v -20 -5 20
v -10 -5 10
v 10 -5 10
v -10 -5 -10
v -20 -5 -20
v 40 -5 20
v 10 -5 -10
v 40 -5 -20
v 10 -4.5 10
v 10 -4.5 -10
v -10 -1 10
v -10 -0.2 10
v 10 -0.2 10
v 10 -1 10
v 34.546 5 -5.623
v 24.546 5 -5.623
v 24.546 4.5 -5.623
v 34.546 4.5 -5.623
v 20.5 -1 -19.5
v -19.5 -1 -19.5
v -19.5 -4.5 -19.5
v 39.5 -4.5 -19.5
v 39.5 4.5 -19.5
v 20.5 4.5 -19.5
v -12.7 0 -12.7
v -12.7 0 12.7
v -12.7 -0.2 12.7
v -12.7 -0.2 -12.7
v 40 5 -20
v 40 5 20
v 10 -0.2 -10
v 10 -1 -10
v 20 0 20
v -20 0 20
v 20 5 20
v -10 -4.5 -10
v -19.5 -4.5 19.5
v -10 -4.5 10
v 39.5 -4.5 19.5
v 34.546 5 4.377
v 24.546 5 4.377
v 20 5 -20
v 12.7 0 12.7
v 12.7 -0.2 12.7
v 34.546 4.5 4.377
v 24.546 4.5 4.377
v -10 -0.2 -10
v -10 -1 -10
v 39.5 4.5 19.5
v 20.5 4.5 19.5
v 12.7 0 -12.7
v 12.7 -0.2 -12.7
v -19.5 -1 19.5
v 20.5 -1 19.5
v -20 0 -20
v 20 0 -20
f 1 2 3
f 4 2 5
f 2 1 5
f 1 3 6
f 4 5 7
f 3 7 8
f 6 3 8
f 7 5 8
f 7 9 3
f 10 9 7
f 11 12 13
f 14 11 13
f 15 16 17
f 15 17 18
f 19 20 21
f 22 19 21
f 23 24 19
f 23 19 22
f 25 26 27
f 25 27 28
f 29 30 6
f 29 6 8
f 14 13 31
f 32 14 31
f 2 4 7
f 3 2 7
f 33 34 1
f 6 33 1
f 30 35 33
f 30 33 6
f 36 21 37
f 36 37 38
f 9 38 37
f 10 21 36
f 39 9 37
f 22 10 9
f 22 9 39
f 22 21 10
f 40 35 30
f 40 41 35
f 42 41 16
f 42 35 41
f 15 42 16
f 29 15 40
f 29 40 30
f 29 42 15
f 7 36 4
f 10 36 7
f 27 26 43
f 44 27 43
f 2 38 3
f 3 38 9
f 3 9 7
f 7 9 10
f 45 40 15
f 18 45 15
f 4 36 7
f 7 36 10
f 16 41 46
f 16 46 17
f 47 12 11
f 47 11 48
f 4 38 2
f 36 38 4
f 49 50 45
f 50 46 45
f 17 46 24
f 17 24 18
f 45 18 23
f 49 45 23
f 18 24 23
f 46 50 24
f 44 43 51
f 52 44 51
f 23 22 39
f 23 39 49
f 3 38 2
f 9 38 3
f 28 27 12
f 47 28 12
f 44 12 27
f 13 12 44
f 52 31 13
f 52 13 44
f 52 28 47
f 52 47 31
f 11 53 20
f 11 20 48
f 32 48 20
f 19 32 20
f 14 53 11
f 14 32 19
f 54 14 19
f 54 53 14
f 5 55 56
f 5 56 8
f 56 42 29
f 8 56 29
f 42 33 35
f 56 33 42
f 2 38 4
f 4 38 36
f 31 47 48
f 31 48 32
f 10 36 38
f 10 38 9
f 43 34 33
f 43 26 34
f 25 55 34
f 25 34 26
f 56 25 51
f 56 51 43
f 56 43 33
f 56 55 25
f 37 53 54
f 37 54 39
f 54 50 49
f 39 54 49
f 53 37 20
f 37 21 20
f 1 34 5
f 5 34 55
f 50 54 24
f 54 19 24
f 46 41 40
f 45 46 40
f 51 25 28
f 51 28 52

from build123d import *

# Parameters (mm, degrees)
SKETCH1_W                = 40
SKETCH1_H                = 40
SKETCH1_W_2              = 20
SKETCH1_H_2              = 20
BOSS_EXTRUDE1_DEPTH      = 5
BOSS_EXTRUDE2_DEPTH      = 5
BOSS_EXTRUDE2_DEPTH_BACK = 5
SKETCH1_4_W              = 20
SKETCH1_4_H              = 40
SKETCH2_W                = 25.4
SKETCH2_H                = 25.4
CUT_EXTRUDE1_DEPTH       = 0.2
CUT_EXTRUDE2_DEPTH       = 19.5
CUT_EXTRUDE2_DEPTH_BACK  = 19.5
SKETCH3_W                = 59
SKETCH3_H                = 3.5
CUT_EXTRUDE3_DEPTH       = 19.5
CUT_EXTRUDE3_DEPTH_BACK  = 19.5
SKETCH4_W                = 10
SKETCH4_H                = 10
CUT_EXTRUDE4_DEPTH       = 2
SKETCH7_W                = 20
SKETCH7_H                = 20
BOSS_EXTRUDE3_DEPTH      = 0.5


with BuildPart() as part:
    # Sketch1 → Boss-Extrude1 (new body)
    with BuildSketch(Plane(origin=(0, 0, 0), x_dir=(1, 0, 0), z_dir=(0, 1, 0))):
        Rectangle(SKETCH1_W, SKETCH1_H)
        Rectangle(SKETCH1_W_2, SKETCH1_H_2, mode=Mode.SUBTRACT)
    extrude(amount=-BOSS_EXTRUDE1_DEPTH)

    # Sketch1<4> → Boss-Extrude2 (add, two sides: drawn at the far end of the back side and taken through both)
    with BuildSketch(Plane(origin=(0, 0, 0), x_dir=(1, 0, 0), z_dir=(0, 1, 0)).offset(-BOSS_EXTRUDE2_DEPTH_BACK)):
        with Locations((30, 0)):
            Rectangle(SKETCH1_4_W, SKETCH1_4_H)
    extrude(amount=BOSS_EXTRUDE2_DEPTH + BOSS_EXTRUDE2_DEPTH_BACK)

    # Sketch2 → Cut-Extrude1 (cut)
    with BuildSketch(Plane(origin=(0, 0, 0), x_dir=(1, 0, 0), z_dir=(0, 1, 0))):
        Rectangle(SKETCH2_W, SKETCH2_H)
    extrude(amount=-CUT_EXTRUDE1_DEPTH, mode=Mode.SUBTRACT)

    # Sketch3 → Cut-Extrude2 (cut, two sides: drawn at the far end of the back side and taken through both)
    with BuildSketch(Plane.XY.offset(-CUT_EXTRUDE2_DEPTH_BACK)):
        with Locations((10, -2.75)):
            Rectangle(SKETCH3_W, SKETCH3_H)
    extrude(amount=CUT_EXTRUDE2_DEPTH + CUT_EXTRUDE2_DEPTH_BACK, mode=Mode.SUBTRACT)

    # Sketch5 → Cut-Extrude3 (cut, two sides: drawn at the far end of the back side and taken through both)
    with BuildSketch(Plane.XY.offset(-CUT_EXTRUDE3_DEPTH_BACK)):
        Polygon((39.5, -4.5), (20.5, -4.5), (20, -4.5), (20, -1), (20.5, -1), (20.5, 4.5), (39.5, 4.5), align=None)
    extrude(amount=CUT_EXTRUDE3_DEPTH + CUT_EXTRUDE3_DEPTH_BACK, mode=Mode.SUBTRACT)

    # Sketch4 → Cut-Extrude4 (cut)
    with BuildSketch(Plane(origin=(0, 5, 0), x_dir=(1, 0, 0), z_dir=(0, 1, 0))):
        with Locations((29.545931586, 0.622908533)):
            Rectangle(SKETCH4_W, SKETCH4_H)
    extrude(amount=-CUT_EXTRUDE4_DEPTH, mode=Mode.SUBTRACT)


with BuildPart() as body_2:
    # Sketch7 → Boss-Extrude3 (new body)
    with BuildSketch(Plane(origin=(0, -4.5, 0), x_dir=(1, 0, 0), z_dir=(0, 1, 0))):
        Rectangle(SKETCH7_W, SKETCH7_H)
    extrude(amount=-BOSS_EXTRUDE3_DEPTH)


solid = Compound([part.part, body_2.part])
